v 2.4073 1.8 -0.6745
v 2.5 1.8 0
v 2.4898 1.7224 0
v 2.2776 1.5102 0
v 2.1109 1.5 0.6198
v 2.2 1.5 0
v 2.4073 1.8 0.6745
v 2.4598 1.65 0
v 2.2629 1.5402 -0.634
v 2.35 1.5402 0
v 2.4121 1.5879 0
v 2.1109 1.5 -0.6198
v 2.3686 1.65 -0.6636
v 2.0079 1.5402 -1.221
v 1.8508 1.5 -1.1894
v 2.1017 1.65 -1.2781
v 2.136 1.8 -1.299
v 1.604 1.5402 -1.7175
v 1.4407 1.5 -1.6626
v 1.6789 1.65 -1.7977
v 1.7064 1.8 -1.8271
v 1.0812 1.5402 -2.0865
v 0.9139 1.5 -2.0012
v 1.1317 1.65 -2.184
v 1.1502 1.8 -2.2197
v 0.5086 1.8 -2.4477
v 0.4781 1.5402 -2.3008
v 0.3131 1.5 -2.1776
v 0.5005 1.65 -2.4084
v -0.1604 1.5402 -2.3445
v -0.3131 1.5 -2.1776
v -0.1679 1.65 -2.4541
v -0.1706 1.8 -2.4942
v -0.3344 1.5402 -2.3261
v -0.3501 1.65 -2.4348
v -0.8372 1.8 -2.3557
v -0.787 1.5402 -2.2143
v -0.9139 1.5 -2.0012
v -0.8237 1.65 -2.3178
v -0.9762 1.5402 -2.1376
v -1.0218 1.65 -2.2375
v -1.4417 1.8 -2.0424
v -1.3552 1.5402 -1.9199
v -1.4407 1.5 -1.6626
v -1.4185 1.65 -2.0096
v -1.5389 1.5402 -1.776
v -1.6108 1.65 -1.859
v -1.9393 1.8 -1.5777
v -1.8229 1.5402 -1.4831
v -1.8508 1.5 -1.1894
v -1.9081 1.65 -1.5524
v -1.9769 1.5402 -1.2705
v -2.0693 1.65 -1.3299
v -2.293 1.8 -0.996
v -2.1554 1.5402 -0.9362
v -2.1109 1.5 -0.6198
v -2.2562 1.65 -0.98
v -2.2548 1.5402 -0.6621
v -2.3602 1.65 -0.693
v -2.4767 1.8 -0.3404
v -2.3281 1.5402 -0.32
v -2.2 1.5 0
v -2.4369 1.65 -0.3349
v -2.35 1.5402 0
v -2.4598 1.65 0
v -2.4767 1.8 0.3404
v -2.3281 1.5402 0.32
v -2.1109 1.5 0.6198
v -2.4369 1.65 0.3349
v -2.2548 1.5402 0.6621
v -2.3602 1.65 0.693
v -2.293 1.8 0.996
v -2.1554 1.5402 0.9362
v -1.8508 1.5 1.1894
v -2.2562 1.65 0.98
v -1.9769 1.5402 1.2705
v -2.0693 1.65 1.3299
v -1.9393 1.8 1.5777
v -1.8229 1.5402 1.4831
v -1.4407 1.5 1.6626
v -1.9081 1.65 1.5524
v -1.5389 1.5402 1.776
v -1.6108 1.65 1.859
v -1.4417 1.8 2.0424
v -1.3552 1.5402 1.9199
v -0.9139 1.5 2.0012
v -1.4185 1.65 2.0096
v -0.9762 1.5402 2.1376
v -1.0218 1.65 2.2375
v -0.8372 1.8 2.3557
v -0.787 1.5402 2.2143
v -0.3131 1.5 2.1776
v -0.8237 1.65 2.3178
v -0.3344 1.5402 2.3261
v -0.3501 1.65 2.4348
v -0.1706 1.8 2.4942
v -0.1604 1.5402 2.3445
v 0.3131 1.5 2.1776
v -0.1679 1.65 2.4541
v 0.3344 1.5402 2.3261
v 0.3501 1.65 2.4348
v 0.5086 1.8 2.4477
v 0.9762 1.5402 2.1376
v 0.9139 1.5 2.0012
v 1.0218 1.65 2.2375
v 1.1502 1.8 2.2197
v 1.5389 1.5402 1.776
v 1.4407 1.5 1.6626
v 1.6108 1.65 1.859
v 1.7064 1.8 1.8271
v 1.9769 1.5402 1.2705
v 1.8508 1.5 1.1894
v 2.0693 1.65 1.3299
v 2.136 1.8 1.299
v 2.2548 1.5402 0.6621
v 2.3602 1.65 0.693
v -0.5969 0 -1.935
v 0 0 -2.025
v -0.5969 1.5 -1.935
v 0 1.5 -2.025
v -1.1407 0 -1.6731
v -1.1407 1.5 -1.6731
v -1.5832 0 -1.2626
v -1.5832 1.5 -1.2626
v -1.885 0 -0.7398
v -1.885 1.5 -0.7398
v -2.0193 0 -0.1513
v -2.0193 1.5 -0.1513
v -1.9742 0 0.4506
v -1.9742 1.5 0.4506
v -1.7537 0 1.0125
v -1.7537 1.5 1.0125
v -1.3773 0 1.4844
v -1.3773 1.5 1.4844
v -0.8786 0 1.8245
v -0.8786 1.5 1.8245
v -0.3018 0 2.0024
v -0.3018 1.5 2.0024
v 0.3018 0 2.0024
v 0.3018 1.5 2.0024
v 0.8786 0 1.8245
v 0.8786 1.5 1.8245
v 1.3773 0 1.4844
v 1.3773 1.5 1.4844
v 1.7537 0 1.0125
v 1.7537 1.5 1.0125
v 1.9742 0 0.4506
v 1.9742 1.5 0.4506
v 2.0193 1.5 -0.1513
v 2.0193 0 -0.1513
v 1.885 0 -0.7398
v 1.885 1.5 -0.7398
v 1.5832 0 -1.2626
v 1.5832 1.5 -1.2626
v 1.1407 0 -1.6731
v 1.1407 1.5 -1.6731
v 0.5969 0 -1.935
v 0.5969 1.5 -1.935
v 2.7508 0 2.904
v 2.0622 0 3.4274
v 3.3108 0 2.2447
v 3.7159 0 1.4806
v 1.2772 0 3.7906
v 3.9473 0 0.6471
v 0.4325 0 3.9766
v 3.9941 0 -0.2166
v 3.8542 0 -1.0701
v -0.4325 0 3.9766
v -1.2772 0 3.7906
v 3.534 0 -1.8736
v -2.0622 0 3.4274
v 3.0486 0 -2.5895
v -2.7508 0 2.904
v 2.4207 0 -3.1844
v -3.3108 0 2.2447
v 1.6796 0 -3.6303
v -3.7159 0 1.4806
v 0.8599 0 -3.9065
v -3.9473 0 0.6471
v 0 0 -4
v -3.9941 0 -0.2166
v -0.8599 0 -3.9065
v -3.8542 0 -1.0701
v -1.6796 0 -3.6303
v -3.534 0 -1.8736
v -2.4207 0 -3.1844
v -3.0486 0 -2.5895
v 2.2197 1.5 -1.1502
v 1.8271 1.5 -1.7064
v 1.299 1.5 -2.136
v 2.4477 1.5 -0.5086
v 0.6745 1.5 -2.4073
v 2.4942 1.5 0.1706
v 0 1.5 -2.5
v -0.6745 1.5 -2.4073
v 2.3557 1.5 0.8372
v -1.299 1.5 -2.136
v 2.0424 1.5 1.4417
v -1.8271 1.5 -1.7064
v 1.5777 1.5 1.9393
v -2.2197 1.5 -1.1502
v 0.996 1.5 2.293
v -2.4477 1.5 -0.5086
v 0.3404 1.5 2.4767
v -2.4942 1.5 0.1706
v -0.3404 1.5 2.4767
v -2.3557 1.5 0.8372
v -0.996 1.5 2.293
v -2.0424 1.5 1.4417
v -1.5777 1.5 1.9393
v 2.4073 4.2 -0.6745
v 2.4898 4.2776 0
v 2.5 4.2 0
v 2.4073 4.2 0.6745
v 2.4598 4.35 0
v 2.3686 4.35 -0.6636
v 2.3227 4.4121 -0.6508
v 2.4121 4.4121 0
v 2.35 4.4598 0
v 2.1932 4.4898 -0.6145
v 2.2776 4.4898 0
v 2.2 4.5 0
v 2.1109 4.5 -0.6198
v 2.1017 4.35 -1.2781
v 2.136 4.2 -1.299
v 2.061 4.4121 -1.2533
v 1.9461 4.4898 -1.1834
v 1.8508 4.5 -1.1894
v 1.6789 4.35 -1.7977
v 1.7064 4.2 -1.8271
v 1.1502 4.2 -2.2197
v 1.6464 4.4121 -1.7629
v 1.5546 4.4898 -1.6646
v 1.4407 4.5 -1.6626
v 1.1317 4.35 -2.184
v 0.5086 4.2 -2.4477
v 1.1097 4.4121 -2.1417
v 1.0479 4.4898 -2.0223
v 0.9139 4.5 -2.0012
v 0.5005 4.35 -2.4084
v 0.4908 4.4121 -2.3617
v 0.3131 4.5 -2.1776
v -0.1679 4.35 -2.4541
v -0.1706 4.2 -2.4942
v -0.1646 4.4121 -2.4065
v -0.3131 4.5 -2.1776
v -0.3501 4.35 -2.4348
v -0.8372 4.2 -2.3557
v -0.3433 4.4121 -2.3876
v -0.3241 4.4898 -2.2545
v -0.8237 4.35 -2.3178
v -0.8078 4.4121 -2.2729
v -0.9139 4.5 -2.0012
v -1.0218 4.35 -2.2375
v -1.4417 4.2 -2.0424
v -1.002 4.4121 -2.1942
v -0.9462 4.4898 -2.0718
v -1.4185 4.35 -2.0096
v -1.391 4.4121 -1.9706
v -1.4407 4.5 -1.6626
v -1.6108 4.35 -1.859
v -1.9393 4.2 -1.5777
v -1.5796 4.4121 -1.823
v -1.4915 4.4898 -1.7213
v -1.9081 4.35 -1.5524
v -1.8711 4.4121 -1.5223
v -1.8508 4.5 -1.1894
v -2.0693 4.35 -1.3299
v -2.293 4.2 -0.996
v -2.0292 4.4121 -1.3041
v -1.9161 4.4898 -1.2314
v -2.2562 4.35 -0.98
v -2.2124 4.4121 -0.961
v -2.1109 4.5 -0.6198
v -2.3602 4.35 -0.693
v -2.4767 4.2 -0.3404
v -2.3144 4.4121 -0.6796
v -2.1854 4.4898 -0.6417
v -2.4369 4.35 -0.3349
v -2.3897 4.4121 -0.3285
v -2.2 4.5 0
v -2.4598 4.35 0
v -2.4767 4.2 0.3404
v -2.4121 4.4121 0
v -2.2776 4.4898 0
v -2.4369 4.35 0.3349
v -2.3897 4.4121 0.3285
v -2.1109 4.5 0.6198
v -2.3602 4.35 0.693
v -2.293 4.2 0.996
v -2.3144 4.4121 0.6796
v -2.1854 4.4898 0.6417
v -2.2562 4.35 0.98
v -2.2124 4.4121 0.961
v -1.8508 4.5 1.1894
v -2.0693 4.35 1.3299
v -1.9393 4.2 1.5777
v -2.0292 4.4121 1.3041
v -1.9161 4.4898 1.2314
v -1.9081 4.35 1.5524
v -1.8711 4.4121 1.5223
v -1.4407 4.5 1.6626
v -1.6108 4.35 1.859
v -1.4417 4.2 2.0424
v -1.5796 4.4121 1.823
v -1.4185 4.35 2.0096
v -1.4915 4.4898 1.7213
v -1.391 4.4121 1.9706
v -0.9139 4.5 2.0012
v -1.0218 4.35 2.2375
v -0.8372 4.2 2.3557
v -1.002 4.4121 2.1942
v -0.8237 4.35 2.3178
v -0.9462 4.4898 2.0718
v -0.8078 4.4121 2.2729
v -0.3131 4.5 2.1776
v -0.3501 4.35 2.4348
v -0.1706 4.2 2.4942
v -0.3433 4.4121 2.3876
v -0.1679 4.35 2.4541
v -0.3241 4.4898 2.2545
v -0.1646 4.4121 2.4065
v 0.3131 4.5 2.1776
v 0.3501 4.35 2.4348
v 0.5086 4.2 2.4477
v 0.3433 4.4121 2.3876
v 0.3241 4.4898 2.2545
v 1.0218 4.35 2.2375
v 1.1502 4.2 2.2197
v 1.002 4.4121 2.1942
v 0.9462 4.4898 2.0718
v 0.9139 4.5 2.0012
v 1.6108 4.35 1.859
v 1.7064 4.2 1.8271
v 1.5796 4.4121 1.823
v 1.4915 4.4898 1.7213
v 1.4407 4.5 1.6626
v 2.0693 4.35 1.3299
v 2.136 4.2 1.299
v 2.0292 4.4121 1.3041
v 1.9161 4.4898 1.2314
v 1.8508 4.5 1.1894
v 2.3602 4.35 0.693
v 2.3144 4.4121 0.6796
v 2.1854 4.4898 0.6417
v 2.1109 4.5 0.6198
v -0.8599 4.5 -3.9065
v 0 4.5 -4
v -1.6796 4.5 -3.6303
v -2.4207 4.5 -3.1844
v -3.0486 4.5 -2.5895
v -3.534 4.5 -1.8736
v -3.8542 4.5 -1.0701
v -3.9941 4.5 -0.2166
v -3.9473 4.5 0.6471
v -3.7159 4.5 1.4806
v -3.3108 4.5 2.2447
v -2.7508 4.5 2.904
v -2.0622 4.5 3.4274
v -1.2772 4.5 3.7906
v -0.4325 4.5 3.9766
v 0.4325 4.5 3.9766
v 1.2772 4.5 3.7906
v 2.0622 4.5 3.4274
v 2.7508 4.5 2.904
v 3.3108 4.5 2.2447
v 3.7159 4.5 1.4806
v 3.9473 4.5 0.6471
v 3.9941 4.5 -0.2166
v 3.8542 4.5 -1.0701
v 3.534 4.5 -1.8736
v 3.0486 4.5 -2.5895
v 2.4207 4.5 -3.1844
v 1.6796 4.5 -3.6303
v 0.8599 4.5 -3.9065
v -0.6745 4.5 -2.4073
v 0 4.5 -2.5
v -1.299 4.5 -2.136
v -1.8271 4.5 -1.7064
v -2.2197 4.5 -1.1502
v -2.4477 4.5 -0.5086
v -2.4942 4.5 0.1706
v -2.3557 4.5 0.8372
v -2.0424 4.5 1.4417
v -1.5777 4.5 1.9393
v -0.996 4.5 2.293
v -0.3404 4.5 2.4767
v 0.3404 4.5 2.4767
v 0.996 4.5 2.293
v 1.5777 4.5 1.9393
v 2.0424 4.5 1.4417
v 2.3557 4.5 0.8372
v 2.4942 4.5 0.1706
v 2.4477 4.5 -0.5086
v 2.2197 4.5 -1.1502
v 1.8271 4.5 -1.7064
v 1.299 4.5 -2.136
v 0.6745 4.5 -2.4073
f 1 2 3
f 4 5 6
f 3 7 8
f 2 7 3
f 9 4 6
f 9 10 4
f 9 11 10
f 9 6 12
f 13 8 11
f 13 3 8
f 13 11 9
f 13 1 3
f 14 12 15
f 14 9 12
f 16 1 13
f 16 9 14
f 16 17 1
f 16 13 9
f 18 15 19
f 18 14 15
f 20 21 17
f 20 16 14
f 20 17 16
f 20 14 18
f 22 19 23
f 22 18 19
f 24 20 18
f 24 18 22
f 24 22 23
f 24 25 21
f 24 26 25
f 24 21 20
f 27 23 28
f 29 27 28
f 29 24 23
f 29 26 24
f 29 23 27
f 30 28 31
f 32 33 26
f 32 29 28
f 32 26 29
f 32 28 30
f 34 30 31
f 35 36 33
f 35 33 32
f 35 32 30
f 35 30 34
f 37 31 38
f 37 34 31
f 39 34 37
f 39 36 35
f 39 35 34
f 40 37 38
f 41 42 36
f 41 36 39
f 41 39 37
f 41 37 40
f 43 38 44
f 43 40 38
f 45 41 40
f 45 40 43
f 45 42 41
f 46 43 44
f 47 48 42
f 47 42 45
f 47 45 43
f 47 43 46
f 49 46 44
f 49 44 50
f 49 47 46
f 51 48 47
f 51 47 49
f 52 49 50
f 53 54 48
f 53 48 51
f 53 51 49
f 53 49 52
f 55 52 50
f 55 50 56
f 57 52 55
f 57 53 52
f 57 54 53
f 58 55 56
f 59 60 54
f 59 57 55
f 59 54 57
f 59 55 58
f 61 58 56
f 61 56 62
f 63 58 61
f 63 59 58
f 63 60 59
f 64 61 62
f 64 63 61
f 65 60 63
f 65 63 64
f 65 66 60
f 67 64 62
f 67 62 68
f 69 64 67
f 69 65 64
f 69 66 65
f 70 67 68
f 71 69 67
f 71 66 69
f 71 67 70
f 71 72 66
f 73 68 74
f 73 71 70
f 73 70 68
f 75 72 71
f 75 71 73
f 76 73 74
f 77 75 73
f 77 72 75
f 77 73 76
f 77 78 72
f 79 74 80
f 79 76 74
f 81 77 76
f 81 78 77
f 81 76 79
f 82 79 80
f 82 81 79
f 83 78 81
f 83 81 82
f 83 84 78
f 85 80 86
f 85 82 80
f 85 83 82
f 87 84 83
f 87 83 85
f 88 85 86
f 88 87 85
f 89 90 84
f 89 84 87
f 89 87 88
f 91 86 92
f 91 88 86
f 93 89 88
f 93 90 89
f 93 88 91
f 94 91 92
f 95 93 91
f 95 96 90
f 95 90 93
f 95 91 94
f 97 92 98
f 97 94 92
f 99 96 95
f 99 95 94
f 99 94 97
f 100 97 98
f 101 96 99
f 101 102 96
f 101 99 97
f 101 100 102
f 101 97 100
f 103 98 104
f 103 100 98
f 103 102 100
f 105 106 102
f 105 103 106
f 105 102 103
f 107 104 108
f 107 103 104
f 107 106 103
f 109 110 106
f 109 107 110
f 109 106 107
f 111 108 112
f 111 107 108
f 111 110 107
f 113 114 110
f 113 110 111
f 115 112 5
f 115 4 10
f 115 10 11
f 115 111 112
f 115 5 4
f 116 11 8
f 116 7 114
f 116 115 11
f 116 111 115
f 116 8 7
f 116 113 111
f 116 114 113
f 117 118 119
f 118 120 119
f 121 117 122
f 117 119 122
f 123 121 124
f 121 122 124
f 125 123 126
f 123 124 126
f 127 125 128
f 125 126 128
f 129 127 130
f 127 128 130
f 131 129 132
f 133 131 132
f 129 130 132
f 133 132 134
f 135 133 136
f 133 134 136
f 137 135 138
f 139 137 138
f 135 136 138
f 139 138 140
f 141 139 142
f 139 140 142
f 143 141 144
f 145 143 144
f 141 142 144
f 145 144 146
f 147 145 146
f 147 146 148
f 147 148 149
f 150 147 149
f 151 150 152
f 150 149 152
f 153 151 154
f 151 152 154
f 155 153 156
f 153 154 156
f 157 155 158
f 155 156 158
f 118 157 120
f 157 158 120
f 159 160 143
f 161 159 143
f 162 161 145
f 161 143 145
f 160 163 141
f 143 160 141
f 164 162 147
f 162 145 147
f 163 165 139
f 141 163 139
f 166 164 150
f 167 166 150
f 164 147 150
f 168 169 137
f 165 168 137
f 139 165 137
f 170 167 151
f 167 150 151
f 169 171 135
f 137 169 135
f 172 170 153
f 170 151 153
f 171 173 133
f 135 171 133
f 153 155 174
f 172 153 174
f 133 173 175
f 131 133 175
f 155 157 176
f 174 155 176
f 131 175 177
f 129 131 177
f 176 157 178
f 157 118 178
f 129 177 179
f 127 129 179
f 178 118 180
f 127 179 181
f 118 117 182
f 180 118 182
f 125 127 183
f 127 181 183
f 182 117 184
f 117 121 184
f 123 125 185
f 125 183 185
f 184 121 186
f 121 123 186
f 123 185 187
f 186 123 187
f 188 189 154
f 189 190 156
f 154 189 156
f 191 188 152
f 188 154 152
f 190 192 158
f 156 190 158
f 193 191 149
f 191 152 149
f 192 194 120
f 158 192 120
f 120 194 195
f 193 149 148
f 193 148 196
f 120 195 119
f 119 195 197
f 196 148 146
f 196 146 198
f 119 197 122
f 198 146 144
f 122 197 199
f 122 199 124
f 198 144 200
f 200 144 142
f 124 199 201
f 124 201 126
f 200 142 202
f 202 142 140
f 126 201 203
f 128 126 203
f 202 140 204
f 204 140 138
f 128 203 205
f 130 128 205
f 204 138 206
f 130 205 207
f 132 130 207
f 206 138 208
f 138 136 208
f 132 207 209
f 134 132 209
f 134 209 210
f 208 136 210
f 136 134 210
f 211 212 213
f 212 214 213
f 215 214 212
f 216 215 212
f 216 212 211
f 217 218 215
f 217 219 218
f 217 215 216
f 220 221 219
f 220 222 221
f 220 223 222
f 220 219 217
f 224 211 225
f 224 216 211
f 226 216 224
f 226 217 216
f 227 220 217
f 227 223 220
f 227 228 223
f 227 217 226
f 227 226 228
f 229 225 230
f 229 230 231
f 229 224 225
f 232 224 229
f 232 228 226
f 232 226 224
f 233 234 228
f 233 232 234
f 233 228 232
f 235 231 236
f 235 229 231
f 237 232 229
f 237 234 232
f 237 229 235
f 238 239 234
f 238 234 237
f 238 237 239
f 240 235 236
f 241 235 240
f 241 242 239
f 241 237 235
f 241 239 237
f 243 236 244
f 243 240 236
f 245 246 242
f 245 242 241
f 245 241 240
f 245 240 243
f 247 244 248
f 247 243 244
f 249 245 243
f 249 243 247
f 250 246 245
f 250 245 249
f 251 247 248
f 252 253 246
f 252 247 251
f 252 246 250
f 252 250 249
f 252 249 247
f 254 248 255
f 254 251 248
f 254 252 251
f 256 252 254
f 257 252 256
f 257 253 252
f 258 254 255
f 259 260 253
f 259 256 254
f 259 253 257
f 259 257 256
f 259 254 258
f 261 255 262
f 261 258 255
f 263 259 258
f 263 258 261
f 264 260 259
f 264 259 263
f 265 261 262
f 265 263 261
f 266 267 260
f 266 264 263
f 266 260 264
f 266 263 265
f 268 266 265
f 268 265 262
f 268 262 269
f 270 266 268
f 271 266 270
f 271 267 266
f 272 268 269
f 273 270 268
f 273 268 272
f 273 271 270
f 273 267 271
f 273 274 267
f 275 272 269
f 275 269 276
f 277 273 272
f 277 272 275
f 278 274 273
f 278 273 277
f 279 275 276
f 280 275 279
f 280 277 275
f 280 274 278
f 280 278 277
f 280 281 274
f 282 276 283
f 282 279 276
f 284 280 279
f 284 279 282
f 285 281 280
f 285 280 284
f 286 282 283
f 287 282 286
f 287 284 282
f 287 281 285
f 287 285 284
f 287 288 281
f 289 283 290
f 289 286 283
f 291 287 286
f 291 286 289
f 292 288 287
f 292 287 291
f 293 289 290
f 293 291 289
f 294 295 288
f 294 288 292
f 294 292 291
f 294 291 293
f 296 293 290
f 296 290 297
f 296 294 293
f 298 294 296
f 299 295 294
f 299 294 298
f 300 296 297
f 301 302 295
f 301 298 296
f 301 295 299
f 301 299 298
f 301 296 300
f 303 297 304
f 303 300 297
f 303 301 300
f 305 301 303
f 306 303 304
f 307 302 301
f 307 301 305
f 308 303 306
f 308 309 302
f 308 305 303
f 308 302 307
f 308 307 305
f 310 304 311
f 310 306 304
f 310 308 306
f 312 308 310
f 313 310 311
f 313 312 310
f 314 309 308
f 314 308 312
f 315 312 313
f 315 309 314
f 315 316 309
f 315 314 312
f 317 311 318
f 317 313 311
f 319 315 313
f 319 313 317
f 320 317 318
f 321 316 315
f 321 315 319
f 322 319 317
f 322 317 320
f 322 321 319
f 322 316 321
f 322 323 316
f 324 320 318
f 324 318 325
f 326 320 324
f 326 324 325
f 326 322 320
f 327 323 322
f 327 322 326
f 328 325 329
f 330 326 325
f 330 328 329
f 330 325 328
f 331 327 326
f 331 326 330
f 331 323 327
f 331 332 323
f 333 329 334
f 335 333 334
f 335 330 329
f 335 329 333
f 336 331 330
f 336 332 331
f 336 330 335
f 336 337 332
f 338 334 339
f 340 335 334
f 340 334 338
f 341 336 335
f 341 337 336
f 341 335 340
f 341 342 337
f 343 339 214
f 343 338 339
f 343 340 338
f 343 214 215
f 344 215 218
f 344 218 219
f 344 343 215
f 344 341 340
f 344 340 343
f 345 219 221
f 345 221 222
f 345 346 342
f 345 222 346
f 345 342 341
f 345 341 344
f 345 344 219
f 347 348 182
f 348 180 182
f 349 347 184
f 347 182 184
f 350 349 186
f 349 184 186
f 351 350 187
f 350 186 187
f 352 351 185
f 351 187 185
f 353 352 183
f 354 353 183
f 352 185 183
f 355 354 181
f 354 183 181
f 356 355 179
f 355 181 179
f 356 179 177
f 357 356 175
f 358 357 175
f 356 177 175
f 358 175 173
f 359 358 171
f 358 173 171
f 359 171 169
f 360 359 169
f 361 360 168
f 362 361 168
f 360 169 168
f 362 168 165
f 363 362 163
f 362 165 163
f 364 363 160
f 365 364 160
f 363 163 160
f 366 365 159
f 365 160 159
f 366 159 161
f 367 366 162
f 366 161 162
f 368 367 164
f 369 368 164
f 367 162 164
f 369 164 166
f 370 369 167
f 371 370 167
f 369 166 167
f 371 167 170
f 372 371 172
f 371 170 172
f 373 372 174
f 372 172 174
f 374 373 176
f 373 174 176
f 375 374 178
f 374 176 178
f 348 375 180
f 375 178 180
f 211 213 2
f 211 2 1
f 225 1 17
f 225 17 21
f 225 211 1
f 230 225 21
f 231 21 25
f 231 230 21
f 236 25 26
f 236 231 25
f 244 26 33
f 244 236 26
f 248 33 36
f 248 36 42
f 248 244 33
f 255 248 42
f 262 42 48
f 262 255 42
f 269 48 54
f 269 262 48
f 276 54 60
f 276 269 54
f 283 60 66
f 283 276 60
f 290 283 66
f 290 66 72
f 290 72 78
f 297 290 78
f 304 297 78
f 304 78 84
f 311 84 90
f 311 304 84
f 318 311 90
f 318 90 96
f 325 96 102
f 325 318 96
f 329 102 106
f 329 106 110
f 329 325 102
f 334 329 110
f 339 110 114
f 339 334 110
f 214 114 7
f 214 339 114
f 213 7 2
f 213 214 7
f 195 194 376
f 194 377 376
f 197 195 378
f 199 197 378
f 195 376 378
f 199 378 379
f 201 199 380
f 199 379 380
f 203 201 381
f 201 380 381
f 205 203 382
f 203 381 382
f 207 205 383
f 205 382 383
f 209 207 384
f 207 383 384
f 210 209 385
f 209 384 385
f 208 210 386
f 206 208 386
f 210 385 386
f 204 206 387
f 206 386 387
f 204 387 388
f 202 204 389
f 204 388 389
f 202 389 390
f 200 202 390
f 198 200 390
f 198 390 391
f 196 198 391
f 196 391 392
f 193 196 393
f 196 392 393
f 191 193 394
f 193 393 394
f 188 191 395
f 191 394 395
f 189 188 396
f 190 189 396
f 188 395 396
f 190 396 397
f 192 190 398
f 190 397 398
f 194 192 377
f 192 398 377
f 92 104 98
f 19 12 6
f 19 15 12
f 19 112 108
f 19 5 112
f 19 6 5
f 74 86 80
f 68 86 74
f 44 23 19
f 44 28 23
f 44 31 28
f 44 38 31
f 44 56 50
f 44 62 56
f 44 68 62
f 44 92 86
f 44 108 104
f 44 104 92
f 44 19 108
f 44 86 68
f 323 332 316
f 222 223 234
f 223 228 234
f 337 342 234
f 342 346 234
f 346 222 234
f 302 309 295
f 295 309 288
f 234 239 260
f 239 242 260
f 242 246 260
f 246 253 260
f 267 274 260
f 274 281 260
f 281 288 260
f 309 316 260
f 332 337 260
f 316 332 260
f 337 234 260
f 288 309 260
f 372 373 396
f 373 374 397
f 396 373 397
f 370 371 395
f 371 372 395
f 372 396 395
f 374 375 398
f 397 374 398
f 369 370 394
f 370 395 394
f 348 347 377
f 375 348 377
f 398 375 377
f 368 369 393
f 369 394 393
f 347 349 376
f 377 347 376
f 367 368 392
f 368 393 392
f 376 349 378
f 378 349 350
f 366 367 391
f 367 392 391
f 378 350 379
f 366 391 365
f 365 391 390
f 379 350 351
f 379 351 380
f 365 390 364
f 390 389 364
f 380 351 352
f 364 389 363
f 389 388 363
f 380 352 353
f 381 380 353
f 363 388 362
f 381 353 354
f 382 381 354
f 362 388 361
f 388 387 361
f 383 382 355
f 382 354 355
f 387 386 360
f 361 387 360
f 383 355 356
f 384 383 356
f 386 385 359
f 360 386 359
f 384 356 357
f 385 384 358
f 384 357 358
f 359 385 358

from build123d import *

# Parameters (mm, degrees)
SKETCH_2_W = 2.5
SKETCH_2_H = 3
FILLET_1_R = 0.3


with BuildPart() as part:
    # 草图1 → 旋转1 (revolve)
    with BuildSketch(Plane.XY, mode=Mode.PRIVATE) as revolve_1_sk:
        Polygon((2.025, 0), (2.025, 1.5), (2.5, 1.5), (2.5, 4.5), (4, 4.5), (4, 0), align=None)
    revolve(revolve_1_sk.sketch.rotate(Axis((0, 0, 0), (0, 1, 0)), 90), axis=Axis((0, 0, 0), (0, 1, 0)))


with BuildPart() as body_2:
    # 草图2 → 旋转2 (revolve)
    with BuildSketch(Plane.XY):
        with Locations((1.25, 3)):
            Rectangle(SKETCH_2_W, SKETCH_2_H)
    revolve(axis=Axis((0, 0, 0), (0, 1, 0)))

    # 圆角1
    fillet_1_edges = [body_2.edges().sort_by_distance(p)[0] for p in [
        (-2.5, 4.5, 0),
        (-2.5, 1.5, 0),
    ]]
    fillet(fillet_1_edges, radius=FILLET_1_R)


solid = Compound([part.part, body_2.part])
